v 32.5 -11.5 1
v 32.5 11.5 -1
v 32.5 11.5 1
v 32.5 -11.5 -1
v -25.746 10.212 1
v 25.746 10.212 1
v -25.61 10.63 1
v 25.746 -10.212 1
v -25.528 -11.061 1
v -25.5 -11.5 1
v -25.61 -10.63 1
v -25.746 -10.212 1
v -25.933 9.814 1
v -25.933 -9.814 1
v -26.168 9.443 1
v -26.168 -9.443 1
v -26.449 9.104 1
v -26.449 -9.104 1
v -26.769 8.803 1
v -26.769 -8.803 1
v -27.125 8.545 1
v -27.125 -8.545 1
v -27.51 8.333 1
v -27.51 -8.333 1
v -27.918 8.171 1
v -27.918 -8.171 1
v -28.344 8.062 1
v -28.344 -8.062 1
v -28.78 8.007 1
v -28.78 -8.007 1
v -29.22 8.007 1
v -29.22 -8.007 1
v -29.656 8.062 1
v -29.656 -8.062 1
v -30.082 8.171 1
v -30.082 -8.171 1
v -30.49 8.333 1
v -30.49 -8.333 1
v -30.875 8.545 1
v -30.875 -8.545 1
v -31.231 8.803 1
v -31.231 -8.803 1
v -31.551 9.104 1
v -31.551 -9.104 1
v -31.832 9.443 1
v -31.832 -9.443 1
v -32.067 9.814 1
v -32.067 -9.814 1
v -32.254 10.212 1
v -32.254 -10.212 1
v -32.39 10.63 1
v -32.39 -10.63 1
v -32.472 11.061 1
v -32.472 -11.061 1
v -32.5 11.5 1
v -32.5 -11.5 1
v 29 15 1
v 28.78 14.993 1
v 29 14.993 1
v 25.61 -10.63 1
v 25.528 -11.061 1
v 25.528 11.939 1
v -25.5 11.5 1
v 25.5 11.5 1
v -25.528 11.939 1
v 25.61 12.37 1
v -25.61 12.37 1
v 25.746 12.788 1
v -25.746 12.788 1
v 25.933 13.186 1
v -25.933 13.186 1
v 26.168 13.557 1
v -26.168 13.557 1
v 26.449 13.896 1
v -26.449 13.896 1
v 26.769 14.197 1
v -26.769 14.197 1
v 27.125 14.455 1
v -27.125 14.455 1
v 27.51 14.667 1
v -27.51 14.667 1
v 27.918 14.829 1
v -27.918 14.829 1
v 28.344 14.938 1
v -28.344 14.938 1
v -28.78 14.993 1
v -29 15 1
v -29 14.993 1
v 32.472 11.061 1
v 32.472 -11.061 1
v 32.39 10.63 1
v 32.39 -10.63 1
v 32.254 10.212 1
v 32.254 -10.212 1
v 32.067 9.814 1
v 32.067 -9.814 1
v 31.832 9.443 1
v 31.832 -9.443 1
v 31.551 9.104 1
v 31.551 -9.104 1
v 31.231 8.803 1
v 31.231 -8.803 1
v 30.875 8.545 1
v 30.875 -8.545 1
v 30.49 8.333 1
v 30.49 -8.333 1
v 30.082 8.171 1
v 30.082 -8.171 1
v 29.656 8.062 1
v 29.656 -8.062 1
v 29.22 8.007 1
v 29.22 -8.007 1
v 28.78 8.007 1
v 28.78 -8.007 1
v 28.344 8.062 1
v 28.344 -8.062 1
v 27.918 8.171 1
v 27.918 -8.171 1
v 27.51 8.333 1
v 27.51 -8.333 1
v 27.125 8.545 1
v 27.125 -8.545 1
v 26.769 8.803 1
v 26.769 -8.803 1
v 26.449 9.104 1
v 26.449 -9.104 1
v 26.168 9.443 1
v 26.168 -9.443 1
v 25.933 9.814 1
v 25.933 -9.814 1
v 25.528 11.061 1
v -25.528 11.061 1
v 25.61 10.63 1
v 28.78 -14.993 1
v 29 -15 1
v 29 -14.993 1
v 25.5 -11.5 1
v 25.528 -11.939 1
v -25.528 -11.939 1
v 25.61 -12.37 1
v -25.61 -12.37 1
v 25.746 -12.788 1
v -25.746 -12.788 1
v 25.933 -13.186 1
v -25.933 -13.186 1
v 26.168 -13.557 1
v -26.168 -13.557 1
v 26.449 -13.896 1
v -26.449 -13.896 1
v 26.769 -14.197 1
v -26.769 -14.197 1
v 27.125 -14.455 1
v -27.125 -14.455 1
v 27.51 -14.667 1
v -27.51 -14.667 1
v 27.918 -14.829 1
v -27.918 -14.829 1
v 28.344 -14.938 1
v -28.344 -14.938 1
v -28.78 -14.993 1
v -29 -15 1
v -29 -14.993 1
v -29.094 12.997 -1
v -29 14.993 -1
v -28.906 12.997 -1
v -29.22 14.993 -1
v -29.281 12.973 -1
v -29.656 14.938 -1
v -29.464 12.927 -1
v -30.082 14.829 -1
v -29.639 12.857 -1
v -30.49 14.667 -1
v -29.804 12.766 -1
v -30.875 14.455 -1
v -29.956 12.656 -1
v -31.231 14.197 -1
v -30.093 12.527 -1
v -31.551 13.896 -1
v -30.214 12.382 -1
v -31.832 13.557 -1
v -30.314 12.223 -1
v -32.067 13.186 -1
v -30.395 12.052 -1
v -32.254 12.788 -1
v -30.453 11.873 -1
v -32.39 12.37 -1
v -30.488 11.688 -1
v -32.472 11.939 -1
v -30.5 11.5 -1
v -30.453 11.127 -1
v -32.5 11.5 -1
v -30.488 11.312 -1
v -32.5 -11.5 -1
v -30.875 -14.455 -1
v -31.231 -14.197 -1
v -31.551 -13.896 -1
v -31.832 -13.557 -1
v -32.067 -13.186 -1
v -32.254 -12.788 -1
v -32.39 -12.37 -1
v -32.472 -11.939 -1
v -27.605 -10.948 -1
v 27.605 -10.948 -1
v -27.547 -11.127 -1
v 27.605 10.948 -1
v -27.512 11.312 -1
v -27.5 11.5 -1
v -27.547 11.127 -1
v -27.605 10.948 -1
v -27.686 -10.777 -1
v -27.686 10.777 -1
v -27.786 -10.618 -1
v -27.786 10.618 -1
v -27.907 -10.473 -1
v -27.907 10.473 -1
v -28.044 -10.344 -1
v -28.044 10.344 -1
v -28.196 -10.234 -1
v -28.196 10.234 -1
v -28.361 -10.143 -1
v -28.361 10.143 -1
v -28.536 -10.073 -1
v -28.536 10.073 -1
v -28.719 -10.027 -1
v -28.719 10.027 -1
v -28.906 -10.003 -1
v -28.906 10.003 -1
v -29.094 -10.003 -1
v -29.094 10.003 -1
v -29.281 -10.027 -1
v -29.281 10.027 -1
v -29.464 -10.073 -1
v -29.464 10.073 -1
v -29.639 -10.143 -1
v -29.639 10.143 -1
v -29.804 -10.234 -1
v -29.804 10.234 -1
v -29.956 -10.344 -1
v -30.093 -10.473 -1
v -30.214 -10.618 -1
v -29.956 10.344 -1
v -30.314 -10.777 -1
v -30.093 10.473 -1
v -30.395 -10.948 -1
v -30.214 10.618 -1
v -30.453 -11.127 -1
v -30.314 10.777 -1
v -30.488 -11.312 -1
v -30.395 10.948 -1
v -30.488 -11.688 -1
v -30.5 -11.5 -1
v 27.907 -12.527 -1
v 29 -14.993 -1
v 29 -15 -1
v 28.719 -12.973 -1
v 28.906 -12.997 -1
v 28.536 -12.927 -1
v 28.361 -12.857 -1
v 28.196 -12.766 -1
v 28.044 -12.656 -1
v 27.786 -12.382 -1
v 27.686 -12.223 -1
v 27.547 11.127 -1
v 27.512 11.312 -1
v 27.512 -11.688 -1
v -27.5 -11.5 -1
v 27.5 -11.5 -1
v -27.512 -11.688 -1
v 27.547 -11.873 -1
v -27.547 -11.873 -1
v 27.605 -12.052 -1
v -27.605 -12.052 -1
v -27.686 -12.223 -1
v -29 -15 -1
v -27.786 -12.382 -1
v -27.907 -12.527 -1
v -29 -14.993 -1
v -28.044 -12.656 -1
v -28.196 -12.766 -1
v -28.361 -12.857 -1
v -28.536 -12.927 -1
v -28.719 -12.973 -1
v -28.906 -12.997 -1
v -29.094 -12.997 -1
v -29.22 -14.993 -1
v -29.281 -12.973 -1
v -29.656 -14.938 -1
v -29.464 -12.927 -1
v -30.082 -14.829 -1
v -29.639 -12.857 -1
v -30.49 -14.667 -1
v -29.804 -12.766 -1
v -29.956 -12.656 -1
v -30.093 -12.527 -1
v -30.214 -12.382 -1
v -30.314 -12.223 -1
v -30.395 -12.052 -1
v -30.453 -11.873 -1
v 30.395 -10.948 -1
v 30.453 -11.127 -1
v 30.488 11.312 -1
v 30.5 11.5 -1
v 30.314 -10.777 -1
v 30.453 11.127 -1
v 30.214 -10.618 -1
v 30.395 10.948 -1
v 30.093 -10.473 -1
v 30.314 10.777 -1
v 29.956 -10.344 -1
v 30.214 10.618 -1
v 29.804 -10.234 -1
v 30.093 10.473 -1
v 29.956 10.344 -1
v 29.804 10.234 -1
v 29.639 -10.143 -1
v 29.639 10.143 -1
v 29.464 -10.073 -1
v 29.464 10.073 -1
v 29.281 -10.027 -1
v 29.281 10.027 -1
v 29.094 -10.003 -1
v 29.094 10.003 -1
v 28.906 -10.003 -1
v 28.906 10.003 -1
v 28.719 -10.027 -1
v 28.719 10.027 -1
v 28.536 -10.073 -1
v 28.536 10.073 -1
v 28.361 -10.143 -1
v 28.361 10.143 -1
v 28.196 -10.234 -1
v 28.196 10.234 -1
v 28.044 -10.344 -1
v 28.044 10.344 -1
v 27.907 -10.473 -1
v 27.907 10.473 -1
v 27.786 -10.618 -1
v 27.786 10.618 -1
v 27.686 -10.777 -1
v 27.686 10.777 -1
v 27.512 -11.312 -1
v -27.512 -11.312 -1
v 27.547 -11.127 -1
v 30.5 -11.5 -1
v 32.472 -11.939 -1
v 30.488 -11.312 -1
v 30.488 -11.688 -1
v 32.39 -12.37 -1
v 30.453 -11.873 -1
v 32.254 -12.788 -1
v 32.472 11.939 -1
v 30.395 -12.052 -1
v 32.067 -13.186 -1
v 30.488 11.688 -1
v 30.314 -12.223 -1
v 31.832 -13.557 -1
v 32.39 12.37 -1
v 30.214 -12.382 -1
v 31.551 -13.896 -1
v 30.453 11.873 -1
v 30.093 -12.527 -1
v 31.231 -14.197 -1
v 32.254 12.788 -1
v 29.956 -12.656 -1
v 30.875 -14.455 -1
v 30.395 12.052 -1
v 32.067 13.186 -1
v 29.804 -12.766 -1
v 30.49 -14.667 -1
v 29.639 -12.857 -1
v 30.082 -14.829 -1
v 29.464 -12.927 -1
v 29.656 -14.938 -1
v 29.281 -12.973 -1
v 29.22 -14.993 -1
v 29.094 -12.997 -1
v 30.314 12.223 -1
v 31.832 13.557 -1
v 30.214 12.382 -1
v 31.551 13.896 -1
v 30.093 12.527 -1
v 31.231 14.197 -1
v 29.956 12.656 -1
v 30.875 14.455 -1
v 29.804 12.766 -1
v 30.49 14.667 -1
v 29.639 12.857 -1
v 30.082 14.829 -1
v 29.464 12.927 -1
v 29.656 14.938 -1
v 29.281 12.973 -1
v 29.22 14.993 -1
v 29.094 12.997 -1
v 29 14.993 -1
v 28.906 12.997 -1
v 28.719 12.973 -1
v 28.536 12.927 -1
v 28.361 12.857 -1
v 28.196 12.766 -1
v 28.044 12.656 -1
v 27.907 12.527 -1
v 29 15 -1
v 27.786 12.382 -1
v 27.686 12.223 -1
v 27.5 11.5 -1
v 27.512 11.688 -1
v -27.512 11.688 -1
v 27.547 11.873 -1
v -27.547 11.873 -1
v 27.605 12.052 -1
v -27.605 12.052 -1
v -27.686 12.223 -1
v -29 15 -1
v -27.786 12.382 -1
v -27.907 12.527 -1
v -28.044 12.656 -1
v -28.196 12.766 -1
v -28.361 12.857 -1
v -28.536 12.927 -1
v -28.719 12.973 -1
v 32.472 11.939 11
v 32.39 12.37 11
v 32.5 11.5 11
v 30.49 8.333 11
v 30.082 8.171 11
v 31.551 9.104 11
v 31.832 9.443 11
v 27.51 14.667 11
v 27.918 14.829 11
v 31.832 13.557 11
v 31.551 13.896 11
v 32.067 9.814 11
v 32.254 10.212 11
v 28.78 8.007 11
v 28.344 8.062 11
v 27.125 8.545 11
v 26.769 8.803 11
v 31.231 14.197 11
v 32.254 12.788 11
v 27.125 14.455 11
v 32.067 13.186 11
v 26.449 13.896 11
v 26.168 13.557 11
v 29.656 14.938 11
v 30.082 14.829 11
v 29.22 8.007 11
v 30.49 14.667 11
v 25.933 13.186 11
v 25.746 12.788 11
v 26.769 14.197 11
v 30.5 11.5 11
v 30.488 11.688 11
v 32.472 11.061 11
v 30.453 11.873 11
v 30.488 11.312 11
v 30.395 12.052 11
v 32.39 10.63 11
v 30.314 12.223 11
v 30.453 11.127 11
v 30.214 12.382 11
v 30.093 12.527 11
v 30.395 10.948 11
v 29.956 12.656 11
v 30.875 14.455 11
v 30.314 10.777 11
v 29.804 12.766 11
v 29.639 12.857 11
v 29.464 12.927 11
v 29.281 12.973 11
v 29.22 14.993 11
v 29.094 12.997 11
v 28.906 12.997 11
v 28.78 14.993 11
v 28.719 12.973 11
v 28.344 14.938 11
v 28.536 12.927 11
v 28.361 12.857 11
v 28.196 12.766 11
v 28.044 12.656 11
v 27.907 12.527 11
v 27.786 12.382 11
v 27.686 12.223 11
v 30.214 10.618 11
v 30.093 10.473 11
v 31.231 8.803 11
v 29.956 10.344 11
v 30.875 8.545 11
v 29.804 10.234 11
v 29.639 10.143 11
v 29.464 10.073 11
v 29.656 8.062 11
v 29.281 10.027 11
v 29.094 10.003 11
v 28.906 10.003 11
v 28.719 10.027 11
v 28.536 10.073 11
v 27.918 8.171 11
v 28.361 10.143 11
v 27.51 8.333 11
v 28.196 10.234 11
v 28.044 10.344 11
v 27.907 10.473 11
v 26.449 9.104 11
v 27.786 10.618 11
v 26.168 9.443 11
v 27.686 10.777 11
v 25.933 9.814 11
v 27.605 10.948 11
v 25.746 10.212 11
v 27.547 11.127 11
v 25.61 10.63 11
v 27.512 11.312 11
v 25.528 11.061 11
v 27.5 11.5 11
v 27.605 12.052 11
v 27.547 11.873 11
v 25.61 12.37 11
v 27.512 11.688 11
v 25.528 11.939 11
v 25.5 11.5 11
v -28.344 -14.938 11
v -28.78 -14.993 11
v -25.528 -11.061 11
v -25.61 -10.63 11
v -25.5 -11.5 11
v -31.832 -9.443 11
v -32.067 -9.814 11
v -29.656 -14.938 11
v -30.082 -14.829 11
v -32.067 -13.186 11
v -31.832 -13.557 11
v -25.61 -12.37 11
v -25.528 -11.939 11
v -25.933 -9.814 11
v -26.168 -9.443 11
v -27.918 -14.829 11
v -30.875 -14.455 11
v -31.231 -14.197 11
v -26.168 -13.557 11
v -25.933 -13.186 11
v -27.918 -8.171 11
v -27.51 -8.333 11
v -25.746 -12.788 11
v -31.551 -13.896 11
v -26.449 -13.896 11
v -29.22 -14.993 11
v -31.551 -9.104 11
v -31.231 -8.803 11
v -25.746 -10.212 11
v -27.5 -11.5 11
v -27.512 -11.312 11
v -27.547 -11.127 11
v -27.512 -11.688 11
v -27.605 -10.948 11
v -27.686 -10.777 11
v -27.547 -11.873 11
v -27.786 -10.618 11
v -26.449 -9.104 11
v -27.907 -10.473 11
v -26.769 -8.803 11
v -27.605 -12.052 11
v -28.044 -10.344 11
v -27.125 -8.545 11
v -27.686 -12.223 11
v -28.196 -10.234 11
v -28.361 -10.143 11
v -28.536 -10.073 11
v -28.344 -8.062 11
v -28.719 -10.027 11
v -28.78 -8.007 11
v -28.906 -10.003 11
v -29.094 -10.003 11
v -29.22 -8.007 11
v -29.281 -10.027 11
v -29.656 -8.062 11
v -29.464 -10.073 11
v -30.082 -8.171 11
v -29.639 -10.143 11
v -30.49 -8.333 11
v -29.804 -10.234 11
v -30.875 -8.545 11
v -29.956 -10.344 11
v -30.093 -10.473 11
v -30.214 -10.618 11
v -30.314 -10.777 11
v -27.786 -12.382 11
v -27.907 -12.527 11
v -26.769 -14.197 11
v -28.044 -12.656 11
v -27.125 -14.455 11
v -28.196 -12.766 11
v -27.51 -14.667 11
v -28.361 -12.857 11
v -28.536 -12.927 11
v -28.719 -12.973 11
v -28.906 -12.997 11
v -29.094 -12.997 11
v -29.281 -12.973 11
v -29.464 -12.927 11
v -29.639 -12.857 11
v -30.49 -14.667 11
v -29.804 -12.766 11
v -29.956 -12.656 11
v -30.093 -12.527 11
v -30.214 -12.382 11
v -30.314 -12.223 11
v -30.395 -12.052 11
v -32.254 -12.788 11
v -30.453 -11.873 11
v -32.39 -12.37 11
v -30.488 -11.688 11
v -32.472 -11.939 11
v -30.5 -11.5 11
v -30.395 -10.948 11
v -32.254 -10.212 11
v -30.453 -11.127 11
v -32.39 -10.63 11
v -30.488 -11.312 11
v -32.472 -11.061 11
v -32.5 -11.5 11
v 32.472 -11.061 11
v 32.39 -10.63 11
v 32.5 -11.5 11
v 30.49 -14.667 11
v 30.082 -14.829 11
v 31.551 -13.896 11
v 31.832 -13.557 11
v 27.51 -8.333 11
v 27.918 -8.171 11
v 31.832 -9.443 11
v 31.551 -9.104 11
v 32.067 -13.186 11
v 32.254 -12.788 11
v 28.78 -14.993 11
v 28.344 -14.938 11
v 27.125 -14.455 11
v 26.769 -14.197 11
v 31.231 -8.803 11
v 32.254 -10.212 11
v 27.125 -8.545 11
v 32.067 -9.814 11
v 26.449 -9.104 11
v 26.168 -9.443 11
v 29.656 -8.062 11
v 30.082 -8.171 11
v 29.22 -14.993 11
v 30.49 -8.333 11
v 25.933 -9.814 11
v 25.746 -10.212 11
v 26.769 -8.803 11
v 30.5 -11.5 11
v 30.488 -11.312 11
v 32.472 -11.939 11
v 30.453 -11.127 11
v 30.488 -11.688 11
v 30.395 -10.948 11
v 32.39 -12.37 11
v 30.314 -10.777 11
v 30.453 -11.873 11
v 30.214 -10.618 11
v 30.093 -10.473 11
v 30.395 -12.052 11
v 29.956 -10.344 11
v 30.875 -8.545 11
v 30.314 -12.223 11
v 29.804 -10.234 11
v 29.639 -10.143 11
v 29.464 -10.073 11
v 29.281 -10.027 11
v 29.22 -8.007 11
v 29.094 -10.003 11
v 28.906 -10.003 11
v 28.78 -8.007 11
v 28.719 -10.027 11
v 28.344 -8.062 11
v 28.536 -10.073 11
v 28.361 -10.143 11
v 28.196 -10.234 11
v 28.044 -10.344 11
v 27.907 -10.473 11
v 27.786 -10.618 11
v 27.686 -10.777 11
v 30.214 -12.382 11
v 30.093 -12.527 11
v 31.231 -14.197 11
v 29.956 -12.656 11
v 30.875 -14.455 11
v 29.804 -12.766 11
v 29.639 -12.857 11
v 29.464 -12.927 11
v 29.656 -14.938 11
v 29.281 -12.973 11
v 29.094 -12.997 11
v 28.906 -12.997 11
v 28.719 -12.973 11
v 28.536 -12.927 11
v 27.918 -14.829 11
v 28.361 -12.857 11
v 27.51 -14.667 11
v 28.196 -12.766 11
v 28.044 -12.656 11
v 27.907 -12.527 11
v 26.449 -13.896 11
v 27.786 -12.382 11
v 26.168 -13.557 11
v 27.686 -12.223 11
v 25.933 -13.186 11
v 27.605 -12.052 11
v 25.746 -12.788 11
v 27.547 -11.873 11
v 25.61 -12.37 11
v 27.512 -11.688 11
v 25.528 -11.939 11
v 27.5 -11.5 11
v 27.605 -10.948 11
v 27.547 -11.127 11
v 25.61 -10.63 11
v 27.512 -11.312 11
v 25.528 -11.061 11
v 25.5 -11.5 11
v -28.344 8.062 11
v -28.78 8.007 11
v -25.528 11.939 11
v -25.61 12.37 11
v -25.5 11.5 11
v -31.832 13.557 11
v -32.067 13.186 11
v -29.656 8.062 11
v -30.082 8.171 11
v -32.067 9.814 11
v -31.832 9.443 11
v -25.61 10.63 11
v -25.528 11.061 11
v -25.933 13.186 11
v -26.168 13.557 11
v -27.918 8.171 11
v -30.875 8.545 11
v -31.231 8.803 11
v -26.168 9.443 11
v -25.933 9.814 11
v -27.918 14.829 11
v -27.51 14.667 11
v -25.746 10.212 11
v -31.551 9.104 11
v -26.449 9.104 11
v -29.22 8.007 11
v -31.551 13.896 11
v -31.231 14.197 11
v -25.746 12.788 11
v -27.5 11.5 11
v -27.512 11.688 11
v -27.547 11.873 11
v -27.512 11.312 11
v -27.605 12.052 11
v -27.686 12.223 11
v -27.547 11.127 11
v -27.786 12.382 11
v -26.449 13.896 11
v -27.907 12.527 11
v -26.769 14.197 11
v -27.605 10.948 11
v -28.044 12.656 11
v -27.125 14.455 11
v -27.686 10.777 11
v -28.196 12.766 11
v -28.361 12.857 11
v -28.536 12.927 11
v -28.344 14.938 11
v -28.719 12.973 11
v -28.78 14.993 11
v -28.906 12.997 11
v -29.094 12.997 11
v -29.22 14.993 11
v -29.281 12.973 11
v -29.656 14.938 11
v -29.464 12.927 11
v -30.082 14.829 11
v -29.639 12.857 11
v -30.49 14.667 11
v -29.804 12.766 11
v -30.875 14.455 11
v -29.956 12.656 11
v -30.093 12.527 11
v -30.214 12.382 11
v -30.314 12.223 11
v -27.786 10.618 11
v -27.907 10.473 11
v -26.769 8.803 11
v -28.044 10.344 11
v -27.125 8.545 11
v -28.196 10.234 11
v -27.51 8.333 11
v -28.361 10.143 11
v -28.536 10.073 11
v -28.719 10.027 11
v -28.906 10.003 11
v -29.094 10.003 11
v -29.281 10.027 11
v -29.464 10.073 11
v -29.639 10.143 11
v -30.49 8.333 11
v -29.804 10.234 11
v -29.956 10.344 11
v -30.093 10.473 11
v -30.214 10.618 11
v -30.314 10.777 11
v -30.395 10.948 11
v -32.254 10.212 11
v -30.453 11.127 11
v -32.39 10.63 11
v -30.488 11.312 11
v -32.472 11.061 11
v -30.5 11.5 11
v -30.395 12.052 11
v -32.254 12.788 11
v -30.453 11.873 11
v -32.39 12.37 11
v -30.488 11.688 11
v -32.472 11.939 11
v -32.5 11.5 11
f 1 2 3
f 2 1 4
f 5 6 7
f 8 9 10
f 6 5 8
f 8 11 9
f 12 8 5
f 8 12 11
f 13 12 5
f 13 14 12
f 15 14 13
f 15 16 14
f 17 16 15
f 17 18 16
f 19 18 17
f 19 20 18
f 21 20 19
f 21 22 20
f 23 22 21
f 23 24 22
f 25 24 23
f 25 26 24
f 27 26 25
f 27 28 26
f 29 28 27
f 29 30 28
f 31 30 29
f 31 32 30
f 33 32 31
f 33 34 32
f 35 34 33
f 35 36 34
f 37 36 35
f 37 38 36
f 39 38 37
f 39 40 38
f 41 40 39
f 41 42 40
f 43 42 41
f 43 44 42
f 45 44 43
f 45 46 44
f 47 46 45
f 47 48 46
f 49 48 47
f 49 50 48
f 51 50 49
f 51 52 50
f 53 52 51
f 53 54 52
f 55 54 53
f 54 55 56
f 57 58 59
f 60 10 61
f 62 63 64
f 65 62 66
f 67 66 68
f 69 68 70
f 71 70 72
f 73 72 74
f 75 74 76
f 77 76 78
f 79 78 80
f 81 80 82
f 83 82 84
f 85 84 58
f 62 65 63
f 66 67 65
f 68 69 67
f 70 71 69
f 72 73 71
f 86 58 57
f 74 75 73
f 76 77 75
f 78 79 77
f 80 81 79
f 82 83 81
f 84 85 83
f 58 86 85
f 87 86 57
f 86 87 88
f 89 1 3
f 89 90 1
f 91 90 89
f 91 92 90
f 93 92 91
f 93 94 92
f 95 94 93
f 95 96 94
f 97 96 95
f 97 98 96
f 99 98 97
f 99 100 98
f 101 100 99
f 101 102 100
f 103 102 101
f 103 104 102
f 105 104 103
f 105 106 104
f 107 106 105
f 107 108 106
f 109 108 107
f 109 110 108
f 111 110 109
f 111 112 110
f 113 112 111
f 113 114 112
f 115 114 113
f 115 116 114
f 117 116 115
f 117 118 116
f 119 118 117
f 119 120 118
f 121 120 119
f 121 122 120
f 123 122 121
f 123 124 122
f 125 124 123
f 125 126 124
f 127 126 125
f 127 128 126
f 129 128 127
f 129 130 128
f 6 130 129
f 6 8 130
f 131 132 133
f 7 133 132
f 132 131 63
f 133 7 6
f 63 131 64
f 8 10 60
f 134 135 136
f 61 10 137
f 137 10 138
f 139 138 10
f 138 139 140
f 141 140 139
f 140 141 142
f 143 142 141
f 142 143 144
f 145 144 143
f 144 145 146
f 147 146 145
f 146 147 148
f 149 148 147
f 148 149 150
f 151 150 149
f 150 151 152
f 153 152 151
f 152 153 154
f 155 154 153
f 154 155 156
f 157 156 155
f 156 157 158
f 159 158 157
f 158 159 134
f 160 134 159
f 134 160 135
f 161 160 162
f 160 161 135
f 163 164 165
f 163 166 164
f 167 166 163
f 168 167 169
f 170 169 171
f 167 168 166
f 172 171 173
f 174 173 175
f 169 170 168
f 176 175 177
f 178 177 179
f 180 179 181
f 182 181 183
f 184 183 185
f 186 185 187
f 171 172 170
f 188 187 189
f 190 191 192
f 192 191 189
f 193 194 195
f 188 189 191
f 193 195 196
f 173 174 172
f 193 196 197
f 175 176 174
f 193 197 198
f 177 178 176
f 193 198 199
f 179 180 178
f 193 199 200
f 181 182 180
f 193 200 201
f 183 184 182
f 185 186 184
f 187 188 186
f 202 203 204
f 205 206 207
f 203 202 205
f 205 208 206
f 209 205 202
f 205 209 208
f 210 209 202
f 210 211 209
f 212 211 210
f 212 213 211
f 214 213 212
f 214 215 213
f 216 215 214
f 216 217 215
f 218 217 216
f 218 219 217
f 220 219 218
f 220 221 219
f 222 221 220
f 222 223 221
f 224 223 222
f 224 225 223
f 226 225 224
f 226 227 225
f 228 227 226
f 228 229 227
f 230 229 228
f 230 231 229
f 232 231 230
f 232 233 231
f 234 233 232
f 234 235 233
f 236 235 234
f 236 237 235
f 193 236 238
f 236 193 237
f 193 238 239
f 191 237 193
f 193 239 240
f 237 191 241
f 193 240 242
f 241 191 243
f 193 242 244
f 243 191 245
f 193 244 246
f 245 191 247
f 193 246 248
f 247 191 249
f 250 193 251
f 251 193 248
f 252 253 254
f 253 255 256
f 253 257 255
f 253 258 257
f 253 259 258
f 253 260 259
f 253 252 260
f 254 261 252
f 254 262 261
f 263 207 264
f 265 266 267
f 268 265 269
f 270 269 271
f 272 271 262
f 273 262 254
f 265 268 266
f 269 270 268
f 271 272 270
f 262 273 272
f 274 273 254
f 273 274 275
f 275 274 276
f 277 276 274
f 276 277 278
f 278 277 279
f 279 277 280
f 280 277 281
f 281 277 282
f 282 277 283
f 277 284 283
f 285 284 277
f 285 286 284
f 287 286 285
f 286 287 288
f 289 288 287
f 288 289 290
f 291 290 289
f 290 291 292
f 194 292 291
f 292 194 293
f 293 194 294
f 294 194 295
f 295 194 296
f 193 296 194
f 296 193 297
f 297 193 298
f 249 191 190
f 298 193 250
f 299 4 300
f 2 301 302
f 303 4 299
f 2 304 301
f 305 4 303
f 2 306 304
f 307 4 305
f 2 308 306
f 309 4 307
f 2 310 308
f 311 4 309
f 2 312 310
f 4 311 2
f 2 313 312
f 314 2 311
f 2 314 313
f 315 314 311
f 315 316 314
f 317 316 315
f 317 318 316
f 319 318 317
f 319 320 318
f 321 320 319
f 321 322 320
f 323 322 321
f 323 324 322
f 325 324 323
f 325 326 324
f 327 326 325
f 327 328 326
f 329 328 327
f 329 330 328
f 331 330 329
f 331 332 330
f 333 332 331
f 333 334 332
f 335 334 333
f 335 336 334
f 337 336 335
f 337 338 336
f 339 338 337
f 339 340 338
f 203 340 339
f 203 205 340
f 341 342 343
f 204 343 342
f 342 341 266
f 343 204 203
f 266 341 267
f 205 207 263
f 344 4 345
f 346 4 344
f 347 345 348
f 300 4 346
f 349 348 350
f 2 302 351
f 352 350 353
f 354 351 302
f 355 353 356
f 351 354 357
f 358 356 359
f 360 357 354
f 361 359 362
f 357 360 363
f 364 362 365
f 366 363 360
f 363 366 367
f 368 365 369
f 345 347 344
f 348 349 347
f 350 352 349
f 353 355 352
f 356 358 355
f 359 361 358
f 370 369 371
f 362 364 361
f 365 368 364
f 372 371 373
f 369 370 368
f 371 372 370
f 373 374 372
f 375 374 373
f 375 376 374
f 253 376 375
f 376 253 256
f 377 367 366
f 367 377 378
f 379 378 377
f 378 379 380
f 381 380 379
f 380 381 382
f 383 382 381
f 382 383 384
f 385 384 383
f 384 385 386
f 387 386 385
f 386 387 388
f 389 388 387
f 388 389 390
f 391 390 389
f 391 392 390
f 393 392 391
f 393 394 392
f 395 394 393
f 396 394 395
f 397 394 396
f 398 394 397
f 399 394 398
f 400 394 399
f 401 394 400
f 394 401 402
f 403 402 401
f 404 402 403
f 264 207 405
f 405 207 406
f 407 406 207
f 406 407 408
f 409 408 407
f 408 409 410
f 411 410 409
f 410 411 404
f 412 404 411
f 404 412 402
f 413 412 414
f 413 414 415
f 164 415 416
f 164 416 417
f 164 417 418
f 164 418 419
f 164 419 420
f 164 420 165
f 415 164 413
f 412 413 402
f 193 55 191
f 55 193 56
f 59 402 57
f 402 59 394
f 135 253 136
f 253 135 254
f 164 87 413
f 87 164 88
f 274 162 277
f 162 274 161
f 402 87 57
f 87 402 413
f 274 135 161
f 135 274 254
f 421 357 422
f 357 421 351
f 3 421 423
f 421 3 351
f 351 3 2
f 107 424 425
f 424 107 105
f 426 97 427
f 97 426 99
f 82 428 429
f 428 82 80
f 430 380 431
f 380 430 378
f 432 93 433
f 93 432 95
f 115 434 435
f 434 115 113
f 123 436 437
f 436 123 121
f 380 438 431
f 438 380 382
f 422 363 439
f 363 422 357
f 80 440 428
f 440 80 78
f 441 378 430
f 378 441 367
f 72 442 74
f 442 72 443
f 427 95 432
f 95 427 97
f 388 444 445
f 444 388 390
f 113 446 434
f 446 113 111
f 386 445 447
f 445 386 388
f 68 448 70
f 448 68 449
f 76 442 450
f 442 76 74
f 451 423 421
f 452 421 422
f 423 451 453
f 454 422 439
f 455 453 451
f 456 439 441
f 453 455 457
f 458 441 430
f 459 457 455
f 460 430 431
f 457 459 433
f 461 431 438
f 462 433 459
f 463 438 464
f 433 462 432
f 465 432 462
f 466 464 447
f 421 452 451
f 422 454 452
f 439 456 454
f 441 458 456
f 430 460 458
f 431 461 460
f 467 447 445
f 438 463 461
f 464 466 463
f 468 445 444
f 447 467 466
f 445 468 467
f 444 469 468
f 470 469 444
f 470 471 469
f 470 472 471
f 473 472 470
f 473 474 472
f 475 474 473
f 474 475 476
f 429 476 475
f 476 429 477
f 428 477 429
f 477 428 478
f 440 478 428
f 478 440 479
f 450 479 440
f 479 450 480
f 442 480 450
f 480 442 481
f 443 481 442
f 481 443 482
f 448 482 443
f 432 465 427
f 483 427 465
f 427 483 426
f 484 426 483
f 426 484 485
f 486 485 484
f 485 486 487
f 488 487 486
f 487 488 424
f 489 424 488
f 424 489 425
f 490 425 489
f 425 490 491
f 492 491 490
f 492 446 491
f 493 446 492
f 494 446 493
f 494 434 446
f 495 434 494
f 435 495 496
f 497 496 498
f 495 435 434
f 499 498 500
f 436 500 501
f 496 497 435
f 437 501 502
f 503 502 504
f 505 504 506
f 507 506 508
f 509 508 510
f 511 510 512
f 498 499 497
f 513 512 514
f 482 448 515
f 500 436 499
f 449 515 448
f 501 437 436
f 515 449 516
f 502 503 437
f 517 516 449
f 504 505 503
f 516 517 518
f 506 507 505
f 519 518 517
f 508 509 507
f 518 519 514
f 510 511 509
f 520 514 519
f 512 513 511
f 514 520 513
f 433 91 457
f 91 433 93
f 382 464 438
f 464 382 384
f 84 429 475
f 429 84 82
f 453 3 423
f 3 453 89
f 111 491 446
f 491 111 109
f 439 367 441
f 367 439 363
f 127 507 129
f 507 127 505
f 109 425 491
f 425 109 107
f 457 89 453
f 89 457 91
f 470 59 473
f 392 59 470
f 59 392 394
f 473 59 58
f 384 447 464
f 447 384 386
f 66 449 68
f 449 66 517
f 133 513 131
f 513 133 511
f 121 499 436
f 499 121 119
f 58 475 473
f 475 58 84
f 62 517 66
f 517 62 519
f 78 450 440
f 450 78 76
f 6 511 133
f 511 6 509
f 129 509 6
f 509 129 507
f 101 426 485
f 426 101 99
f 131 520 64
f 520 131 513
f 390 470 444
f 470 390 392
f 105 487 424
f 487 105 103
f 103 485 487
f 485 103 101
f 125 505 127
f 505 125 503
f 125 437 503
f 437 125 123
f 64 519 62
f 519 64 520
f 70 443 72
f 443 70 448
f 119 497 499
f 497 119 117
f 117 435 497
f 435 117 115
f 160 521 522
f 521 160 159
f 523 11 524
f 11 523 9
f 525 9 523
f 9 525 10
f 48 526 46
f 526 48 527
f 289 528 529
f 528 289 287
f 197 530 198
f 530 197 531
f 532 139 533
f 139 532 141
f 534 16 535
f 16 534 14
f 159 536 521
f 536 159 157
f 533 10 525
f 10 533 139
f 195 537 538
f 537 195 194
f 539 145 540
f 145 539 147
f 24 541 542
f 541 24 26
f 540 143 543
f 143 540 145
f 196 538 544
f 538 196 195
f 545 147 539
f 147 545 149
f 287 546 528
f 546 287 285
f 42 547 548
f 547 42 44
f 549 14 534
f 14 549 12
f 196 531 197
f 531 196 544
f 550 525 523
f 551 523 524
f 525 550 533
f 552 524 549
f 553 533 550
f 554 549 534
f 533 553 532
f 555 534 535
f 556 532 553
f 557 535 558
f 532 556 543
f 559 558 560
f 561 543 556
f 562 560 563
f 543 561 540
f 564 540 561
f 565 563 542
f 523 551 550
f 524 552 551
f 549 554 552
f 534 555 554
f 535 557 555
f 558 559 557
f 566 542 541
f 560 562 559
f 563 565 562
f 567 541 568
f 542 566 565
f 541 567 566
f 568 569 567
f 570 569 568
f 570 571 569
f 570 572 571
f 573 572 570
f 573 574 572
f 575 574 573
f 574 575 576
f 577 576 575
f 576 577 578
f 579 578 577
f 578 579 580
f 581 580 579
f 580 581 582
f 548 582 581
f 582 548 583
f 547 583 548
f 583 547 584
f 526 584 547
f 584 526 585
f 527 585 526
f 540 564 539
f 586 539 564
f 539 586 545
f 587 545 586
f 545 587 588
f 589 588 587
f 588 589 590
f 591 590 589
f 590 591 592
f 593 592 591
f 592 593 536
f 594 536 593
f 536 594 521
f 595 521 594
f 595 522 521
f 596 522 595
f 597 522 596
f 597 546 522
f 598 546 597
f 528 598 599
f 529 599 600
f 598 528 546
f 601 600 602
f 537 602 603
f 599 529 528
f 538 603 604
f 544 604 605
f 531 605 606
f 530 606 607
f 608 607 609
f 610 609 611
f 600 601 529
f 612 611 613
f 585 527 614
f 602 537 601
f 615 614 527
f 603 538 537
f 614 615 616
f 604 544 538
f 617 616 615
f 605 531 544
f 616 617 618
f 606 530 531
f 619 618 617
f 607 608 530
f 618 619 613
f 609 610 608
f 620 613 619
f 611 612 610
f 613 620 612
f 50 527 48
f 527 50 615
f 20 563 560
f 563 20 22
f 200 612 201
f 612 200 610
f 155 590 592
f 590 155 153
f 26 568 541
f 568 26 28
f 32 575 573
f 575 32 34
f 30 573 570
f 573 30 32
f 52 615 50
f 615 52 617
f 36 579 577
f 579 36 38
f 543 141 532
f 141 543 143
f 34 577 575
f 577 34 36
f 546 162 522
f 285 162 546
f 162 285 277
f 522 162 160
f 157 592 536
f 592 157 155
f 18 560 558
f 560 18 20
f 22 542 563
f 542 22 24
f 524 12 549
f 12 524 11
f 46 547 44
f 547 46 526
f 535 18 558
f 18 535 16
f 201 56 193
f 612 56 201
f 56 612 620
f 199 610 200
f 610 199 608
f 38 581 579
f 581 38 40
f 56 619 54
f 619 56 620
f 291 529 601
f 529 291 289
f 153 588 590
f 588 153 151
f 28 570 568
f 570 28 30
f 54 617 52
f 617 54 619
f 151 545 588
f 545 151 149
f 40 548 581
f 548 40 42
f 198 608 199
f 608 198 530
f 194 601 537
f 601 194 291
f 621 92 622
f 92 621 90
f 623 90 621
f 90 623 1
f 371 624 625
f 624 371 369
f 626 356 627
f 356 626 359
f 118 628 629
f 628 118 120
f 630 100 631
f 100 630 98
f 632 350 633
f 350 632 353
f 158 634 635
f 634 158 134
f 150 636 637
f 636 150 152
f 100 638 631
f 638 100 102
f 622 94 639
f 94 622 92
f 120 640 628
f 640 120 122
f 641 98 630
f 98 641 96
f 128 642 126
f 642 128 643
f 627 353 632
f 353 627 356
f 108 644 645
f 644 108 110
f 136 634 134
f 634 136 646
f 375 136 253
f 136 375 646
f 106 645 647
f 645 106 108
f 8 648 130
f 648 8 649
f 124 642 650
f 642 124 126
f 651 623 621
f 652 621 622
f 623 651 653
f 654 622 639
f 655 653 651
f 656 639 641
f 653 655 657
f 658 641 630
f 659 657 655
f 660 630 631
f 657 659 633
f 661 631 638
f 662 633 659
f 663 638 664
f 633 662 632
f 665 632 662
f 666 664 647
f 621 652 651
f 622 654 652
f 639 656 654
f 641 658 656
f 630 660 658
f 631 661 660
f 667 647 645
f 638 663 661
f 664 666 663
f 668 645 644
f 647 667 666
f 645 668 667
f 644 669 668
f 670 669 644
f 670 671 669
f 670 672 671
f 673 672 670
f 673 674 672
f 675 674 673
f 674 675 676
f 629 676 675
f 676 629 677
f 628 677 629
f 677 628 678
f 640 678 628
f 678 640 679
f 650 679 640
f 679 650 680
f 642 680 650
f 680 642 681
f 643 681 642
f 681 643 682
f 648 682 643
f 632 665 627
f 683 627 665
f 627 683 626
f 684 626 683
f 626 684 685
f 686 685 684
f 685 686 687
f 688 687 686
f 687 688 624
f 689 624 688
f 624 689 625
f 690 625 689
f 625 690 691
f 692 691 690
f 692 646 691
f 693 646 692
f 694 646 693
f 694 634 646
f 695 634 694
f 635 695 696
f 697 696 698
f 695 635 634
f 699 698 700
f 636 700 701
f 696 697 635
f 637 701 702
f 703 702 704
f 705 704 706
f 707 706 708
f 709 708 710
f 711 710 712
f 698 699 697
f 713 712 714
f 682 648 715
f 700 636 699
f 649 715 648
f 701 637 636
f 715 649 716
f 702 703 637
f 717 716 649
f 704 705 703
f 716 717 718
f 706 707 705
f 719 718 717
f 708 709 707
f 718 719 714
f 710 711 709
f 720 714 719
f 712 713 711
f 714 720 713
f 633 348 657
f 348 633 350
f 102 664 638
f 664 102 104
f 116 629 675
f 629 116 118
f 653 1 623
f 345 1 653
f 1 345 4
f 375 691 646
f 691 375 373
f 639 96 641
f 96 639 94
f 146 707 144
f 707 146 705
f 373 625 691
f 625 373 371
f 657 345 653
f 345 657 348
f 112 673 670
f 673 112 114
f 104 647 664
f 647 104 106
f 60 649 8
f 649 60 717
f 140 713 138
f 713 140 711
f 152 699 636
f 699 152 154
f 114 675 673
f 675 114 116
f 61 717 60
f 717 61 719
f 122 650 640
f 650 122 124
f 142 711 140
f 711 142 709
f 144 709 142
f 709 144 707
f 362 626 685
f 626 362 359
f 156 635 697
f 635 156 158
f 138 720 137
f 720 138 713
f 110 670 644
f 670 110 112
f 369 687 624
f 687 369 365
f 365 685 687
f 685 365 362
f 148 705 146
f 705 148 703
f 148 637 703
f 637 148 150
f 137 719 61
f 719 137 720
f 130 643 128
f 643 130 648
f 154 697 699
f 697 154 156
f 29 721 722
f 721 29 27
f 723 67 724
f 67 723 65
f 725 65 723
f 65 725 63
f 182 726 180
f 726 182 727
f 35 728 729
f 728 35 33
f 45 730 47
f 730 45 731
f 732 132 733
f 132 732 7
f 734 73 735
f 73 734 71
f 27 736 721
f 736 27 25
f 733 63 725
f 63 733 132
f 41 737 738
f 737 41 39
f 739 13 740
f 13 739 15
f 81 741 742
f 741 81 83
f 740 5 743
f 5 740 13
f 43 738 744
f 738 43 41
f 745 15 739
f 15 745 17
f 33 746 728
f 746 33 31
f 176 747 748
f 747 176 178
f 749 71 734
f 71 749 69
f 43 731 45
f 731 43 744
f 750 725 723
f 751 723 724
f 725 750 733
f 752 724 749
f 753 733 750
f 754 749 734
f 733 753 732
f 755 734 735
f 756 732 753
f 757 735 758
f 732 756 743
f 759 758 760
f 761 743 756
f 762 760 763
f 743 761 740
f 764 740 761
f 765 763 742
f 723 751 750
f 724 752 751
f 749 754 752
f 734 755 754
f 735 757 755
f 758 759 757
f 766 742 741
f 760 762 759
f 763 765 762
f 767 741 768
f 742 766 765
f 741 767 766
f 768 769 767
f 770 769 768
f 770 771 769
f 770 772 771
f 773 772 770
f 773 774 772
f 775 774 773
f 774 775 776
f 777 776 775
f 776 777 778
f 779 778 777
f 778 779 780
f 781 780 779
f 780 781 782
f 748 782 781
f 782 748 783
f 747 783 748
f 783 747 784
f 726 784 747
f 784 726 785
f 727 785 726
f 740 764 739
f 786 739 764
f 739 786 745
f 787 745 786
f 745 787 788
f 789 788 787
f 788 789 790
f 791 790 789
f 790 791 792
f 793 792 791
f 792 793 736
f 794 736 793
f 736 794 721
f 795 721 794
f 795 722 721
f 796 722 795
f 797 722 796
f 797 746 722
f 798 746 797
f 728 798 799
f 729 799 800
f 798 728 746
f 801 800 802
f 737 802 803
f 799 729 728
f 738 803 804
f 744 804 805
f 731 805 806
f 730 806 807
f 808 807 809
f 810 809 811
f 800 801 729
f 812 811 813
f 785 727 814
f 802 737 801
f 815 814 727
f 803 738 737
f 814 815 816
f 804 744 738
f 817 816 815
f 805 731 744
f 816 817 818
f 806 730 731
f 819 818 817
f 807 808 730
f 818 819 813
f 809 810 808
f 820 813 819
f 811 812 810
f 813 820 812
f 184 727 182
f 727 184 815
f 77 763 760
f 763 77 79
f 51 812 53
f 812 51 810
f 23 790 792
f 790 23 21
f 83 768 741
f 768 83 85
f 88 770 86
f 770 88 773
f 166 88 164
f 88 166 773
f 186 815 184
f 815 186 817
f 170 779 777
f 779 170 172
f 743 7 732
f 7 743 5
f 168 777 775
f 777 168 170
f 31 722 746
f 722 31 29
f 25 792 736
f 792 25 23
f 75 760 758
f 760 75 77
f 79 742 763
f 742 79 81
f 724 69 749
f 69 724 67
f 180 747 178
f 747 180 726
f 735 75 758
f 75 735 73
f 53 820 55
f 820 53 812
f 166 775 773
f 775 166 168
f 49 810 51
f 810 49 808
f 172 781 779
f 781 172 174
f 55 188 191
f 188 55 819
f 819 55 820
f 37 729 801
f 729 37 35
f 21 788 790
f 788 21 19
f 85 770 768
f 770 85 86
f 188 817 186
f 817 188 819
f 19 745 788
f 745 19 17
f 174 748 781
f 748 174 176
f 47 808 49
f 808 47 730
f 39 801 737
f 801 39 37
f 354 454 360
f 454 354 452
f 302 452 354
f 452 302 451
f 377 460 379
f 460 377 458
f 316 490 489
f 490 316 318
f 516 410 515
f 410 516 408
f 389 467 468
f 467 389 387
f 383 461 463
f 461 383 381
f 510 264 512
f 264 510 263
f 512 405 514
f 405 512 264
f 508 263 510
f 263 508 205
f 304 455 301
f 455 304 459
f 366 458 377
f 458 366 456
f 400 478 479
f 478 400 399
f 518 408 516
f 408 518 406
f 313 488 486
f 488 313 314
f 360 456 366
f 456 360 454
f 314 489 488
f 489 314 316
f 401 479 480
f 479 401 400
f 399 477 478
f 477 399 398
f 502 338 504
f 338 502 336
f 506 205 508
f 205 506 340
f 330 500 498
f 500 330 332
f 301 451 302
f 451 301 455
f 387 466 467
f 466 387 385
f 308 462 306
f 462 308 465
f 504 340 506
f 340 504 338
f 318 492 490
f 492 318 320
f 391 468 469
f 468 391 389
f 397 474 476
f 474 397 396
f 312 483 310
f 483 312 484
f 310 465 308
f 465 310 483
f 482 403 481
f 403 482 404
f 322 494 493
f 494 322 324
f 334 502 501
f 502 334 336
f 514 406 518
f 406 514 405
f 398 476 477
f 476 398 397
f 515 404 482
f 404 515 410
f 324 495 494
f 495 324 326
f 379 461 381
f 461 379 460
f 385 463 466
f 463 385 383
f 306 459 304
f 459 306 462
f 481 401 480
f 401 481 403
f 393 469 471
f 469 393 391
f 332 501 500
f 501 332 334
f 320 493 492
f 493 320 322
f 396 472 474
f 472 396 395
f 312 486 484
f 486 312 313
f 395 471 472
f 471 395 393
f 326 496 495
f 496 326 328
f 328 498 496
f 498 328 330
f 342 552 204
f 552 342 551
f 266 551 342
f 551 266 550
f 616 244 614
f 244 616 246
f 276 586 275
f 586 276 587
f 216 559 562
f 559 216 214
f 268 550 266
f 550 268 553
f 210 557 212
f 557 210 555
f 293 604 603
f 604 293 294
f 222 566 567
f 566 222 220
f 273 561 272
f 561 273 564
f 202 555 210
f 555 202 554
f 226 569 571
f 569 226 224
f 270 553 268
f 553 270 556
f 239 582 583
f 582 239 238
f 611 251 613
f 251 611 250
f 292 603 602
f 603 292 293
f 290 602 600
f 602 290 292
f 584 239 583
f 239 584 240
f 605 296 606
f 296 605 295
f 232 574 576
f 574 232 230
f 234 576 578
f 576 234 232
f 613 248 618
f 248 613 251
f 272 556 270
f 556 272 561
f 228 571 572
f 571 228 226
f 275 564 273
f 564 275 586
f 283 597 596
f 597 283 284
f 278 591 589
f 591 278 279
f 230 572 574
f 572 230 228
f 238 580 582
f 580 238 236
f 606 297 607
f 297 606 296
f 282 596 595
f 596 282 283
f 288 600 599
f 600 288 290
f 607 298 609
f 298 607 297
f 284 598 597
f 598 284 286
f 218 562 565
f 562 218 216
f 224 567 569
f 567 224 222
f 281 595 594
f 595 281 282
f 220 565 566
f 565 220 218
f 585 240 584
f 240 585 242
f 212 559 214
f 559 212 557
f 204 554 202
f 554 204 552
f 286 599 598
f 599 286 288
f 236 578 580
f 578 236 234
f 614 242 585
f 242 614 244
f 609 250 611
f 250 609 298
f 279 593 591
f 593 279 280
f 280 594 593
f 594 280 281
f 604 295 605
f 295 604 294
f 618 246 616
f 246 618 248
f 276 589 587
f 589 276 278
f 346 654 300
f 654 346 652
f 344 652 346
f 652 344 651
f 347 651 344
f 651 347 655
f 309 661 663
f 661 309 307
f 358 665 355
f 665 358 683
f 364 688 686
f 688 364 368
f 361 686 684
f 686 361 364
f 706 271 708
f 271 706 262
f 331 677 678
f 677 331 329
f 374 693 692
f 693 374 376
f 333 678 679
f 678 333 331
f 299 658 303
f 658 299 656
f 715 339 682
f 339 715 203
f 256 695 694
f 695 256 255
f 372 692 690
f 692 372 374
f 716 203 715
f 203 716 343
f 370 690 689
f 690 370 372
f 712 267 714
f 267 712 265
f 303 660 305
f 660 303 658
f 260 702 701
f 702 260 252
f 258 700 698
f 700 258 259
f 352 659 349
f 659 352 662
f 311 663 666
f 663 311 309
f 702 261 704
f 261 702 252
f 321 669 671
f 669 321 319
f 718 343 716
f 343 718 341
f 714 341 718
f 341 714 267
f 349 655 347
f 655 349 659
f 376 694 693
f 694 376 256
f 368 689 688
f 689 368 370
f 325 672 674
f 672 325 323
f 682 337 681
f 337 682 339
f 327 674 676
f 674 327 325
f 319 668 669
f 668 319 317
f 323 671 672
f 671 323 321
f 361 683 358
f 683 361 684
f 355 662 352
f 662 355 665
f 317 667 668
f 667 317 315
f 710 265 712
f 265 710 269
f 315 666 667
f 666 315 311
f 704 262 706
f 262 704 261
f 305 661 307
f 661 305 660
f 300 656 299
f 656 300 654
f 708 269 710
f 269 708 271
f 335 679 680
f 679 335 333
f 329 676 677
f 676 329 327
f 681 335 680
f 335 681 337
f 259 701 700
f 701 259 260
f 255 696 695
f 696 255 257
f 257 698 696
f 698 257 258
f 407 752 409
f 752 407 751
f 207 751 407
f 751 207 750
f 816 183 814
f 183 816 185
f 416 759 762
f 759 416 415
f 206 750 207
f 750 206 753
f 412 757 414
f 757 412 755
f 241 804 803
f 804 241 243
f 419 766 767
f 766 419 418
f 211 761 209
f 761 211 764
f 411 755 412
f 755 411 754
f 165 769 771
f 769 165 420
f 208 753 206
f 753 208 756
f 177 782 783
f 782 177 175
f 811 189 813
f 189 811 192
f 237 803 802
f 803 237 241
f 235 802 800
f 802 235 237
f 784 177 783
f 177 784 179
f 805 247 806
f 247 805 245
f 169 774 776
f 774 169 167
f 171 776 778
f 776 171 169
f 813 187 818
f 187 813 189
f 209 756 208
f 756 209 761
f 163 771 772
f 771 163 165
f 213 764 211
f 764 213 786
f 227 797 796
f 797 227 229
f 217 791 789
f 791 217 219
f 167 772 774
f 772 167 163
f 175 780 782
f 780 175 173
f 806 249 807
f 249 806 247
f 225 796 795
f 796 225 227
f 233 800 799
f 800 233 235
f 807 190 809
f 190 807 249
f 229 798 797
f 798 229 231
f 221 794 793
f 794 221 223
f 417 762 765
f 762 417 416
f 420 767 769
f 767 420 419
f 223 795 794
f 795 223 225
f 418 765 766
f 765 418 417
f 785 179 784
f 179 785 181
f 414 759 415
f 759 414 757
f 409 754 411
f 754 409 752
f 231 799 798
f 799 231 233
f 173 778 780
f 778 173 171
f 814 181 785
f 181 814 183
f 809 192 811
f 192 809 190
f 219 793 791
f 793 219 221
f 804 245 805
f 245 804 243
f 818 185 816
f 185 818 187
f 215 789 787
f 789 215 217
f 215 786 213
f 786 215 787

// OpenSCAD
top_thickness = 2;
cly_height = 12;
cly_sides = 50;
cly_radius1 = 3.5;
cly_radius2 = 3.5;

cly_off_up = cly_height - ((cly_height/2)+1);
//cly_off_up = 0;


union()
{
    
    difference()
    {
        union()
        {
            cube([65,23,top_thickness],center=true);
            cube([58,30,top_thickness],center=true);
            translate([29,11.5,cly_off_up])cylinder(cly_height,cly_radius1,cly_radius2,center=true,$fn=cly_sides);
            translate([-29,-11.5,cly_off_up])cylinder(cly_height,cly_radius1,cly_radius2,center=true,$fn=cly_sides);
            translate([29,-11.5,cly_off_up])cylinder(cly_height,cly_radius1,cly_radius2,center=true,$fn=cly_sides);
            translate([-29,11.5,cly_off_up])cylinder(cly_height,cly_radius1,cly_radius2,center=true,$fn=cly_sides);
        }
        translate([29,11.5,cly_off_up])cylinder(cly_height,1.5,1.5,center=true,$fn=cly_sides); 
        translate([-29,-11.5,cly_off_up])cylinder(cly_height,1.5,1.5,center=true,$fn=cly_sides); 
        translate([29,-11.5,cly_off_up])cylinder(cly_height,1.5,1.5,center=true,$fn=cly_sides); 
        translate([-29,11.5,cly_off_up])cylinder(cly_height,1.5,1.5,center=true,$fn=cly_sides); 
    }   
}

// BELOW IS AN EXAMPLE OF THE PI ITSELF DO NOT PRINT
/*
union()
{
    translate([0,0,17.5])
    difference()
    {
        union()
        {
            cube([65,23,5],center=true);
            cube([58,30,5],center=true);
            translate([29,11.5,0])cylinder(5,cly_radius1,cly_radius2,center=true,$fn=cly_sides);
            translate([-29,-11.5,0])cylinder(5,cly_radius1,cly_radius2,center=true,$fn=cly_sides);
            translate([29,-11.5,0])cylinder(5,cly_radius1,cly_radius2,center=true,$fn=cly_sides);
            translate([-29,11.5,0])cylinder(5,cly_radius1,cly_radius2,center=true,$fn=cly_sides);
        }
        translate([29,11.5,0])cylinder(5,1.5,1.5,center=true,$fn=cly_sides); 
        translate([-29,-11.5,0])cylinder(5,1.5,1.5,center=true,$fn=cly_sides); 
        translate([29,-11.5,0])cylinder(5,1.5,1.5,center=true,$fn=cly_sides); 
        translate([-29,11.5,0])cylinder(5,1.5,1.5,center=true,$fn=cly_sides); 
    }   
}
*/
